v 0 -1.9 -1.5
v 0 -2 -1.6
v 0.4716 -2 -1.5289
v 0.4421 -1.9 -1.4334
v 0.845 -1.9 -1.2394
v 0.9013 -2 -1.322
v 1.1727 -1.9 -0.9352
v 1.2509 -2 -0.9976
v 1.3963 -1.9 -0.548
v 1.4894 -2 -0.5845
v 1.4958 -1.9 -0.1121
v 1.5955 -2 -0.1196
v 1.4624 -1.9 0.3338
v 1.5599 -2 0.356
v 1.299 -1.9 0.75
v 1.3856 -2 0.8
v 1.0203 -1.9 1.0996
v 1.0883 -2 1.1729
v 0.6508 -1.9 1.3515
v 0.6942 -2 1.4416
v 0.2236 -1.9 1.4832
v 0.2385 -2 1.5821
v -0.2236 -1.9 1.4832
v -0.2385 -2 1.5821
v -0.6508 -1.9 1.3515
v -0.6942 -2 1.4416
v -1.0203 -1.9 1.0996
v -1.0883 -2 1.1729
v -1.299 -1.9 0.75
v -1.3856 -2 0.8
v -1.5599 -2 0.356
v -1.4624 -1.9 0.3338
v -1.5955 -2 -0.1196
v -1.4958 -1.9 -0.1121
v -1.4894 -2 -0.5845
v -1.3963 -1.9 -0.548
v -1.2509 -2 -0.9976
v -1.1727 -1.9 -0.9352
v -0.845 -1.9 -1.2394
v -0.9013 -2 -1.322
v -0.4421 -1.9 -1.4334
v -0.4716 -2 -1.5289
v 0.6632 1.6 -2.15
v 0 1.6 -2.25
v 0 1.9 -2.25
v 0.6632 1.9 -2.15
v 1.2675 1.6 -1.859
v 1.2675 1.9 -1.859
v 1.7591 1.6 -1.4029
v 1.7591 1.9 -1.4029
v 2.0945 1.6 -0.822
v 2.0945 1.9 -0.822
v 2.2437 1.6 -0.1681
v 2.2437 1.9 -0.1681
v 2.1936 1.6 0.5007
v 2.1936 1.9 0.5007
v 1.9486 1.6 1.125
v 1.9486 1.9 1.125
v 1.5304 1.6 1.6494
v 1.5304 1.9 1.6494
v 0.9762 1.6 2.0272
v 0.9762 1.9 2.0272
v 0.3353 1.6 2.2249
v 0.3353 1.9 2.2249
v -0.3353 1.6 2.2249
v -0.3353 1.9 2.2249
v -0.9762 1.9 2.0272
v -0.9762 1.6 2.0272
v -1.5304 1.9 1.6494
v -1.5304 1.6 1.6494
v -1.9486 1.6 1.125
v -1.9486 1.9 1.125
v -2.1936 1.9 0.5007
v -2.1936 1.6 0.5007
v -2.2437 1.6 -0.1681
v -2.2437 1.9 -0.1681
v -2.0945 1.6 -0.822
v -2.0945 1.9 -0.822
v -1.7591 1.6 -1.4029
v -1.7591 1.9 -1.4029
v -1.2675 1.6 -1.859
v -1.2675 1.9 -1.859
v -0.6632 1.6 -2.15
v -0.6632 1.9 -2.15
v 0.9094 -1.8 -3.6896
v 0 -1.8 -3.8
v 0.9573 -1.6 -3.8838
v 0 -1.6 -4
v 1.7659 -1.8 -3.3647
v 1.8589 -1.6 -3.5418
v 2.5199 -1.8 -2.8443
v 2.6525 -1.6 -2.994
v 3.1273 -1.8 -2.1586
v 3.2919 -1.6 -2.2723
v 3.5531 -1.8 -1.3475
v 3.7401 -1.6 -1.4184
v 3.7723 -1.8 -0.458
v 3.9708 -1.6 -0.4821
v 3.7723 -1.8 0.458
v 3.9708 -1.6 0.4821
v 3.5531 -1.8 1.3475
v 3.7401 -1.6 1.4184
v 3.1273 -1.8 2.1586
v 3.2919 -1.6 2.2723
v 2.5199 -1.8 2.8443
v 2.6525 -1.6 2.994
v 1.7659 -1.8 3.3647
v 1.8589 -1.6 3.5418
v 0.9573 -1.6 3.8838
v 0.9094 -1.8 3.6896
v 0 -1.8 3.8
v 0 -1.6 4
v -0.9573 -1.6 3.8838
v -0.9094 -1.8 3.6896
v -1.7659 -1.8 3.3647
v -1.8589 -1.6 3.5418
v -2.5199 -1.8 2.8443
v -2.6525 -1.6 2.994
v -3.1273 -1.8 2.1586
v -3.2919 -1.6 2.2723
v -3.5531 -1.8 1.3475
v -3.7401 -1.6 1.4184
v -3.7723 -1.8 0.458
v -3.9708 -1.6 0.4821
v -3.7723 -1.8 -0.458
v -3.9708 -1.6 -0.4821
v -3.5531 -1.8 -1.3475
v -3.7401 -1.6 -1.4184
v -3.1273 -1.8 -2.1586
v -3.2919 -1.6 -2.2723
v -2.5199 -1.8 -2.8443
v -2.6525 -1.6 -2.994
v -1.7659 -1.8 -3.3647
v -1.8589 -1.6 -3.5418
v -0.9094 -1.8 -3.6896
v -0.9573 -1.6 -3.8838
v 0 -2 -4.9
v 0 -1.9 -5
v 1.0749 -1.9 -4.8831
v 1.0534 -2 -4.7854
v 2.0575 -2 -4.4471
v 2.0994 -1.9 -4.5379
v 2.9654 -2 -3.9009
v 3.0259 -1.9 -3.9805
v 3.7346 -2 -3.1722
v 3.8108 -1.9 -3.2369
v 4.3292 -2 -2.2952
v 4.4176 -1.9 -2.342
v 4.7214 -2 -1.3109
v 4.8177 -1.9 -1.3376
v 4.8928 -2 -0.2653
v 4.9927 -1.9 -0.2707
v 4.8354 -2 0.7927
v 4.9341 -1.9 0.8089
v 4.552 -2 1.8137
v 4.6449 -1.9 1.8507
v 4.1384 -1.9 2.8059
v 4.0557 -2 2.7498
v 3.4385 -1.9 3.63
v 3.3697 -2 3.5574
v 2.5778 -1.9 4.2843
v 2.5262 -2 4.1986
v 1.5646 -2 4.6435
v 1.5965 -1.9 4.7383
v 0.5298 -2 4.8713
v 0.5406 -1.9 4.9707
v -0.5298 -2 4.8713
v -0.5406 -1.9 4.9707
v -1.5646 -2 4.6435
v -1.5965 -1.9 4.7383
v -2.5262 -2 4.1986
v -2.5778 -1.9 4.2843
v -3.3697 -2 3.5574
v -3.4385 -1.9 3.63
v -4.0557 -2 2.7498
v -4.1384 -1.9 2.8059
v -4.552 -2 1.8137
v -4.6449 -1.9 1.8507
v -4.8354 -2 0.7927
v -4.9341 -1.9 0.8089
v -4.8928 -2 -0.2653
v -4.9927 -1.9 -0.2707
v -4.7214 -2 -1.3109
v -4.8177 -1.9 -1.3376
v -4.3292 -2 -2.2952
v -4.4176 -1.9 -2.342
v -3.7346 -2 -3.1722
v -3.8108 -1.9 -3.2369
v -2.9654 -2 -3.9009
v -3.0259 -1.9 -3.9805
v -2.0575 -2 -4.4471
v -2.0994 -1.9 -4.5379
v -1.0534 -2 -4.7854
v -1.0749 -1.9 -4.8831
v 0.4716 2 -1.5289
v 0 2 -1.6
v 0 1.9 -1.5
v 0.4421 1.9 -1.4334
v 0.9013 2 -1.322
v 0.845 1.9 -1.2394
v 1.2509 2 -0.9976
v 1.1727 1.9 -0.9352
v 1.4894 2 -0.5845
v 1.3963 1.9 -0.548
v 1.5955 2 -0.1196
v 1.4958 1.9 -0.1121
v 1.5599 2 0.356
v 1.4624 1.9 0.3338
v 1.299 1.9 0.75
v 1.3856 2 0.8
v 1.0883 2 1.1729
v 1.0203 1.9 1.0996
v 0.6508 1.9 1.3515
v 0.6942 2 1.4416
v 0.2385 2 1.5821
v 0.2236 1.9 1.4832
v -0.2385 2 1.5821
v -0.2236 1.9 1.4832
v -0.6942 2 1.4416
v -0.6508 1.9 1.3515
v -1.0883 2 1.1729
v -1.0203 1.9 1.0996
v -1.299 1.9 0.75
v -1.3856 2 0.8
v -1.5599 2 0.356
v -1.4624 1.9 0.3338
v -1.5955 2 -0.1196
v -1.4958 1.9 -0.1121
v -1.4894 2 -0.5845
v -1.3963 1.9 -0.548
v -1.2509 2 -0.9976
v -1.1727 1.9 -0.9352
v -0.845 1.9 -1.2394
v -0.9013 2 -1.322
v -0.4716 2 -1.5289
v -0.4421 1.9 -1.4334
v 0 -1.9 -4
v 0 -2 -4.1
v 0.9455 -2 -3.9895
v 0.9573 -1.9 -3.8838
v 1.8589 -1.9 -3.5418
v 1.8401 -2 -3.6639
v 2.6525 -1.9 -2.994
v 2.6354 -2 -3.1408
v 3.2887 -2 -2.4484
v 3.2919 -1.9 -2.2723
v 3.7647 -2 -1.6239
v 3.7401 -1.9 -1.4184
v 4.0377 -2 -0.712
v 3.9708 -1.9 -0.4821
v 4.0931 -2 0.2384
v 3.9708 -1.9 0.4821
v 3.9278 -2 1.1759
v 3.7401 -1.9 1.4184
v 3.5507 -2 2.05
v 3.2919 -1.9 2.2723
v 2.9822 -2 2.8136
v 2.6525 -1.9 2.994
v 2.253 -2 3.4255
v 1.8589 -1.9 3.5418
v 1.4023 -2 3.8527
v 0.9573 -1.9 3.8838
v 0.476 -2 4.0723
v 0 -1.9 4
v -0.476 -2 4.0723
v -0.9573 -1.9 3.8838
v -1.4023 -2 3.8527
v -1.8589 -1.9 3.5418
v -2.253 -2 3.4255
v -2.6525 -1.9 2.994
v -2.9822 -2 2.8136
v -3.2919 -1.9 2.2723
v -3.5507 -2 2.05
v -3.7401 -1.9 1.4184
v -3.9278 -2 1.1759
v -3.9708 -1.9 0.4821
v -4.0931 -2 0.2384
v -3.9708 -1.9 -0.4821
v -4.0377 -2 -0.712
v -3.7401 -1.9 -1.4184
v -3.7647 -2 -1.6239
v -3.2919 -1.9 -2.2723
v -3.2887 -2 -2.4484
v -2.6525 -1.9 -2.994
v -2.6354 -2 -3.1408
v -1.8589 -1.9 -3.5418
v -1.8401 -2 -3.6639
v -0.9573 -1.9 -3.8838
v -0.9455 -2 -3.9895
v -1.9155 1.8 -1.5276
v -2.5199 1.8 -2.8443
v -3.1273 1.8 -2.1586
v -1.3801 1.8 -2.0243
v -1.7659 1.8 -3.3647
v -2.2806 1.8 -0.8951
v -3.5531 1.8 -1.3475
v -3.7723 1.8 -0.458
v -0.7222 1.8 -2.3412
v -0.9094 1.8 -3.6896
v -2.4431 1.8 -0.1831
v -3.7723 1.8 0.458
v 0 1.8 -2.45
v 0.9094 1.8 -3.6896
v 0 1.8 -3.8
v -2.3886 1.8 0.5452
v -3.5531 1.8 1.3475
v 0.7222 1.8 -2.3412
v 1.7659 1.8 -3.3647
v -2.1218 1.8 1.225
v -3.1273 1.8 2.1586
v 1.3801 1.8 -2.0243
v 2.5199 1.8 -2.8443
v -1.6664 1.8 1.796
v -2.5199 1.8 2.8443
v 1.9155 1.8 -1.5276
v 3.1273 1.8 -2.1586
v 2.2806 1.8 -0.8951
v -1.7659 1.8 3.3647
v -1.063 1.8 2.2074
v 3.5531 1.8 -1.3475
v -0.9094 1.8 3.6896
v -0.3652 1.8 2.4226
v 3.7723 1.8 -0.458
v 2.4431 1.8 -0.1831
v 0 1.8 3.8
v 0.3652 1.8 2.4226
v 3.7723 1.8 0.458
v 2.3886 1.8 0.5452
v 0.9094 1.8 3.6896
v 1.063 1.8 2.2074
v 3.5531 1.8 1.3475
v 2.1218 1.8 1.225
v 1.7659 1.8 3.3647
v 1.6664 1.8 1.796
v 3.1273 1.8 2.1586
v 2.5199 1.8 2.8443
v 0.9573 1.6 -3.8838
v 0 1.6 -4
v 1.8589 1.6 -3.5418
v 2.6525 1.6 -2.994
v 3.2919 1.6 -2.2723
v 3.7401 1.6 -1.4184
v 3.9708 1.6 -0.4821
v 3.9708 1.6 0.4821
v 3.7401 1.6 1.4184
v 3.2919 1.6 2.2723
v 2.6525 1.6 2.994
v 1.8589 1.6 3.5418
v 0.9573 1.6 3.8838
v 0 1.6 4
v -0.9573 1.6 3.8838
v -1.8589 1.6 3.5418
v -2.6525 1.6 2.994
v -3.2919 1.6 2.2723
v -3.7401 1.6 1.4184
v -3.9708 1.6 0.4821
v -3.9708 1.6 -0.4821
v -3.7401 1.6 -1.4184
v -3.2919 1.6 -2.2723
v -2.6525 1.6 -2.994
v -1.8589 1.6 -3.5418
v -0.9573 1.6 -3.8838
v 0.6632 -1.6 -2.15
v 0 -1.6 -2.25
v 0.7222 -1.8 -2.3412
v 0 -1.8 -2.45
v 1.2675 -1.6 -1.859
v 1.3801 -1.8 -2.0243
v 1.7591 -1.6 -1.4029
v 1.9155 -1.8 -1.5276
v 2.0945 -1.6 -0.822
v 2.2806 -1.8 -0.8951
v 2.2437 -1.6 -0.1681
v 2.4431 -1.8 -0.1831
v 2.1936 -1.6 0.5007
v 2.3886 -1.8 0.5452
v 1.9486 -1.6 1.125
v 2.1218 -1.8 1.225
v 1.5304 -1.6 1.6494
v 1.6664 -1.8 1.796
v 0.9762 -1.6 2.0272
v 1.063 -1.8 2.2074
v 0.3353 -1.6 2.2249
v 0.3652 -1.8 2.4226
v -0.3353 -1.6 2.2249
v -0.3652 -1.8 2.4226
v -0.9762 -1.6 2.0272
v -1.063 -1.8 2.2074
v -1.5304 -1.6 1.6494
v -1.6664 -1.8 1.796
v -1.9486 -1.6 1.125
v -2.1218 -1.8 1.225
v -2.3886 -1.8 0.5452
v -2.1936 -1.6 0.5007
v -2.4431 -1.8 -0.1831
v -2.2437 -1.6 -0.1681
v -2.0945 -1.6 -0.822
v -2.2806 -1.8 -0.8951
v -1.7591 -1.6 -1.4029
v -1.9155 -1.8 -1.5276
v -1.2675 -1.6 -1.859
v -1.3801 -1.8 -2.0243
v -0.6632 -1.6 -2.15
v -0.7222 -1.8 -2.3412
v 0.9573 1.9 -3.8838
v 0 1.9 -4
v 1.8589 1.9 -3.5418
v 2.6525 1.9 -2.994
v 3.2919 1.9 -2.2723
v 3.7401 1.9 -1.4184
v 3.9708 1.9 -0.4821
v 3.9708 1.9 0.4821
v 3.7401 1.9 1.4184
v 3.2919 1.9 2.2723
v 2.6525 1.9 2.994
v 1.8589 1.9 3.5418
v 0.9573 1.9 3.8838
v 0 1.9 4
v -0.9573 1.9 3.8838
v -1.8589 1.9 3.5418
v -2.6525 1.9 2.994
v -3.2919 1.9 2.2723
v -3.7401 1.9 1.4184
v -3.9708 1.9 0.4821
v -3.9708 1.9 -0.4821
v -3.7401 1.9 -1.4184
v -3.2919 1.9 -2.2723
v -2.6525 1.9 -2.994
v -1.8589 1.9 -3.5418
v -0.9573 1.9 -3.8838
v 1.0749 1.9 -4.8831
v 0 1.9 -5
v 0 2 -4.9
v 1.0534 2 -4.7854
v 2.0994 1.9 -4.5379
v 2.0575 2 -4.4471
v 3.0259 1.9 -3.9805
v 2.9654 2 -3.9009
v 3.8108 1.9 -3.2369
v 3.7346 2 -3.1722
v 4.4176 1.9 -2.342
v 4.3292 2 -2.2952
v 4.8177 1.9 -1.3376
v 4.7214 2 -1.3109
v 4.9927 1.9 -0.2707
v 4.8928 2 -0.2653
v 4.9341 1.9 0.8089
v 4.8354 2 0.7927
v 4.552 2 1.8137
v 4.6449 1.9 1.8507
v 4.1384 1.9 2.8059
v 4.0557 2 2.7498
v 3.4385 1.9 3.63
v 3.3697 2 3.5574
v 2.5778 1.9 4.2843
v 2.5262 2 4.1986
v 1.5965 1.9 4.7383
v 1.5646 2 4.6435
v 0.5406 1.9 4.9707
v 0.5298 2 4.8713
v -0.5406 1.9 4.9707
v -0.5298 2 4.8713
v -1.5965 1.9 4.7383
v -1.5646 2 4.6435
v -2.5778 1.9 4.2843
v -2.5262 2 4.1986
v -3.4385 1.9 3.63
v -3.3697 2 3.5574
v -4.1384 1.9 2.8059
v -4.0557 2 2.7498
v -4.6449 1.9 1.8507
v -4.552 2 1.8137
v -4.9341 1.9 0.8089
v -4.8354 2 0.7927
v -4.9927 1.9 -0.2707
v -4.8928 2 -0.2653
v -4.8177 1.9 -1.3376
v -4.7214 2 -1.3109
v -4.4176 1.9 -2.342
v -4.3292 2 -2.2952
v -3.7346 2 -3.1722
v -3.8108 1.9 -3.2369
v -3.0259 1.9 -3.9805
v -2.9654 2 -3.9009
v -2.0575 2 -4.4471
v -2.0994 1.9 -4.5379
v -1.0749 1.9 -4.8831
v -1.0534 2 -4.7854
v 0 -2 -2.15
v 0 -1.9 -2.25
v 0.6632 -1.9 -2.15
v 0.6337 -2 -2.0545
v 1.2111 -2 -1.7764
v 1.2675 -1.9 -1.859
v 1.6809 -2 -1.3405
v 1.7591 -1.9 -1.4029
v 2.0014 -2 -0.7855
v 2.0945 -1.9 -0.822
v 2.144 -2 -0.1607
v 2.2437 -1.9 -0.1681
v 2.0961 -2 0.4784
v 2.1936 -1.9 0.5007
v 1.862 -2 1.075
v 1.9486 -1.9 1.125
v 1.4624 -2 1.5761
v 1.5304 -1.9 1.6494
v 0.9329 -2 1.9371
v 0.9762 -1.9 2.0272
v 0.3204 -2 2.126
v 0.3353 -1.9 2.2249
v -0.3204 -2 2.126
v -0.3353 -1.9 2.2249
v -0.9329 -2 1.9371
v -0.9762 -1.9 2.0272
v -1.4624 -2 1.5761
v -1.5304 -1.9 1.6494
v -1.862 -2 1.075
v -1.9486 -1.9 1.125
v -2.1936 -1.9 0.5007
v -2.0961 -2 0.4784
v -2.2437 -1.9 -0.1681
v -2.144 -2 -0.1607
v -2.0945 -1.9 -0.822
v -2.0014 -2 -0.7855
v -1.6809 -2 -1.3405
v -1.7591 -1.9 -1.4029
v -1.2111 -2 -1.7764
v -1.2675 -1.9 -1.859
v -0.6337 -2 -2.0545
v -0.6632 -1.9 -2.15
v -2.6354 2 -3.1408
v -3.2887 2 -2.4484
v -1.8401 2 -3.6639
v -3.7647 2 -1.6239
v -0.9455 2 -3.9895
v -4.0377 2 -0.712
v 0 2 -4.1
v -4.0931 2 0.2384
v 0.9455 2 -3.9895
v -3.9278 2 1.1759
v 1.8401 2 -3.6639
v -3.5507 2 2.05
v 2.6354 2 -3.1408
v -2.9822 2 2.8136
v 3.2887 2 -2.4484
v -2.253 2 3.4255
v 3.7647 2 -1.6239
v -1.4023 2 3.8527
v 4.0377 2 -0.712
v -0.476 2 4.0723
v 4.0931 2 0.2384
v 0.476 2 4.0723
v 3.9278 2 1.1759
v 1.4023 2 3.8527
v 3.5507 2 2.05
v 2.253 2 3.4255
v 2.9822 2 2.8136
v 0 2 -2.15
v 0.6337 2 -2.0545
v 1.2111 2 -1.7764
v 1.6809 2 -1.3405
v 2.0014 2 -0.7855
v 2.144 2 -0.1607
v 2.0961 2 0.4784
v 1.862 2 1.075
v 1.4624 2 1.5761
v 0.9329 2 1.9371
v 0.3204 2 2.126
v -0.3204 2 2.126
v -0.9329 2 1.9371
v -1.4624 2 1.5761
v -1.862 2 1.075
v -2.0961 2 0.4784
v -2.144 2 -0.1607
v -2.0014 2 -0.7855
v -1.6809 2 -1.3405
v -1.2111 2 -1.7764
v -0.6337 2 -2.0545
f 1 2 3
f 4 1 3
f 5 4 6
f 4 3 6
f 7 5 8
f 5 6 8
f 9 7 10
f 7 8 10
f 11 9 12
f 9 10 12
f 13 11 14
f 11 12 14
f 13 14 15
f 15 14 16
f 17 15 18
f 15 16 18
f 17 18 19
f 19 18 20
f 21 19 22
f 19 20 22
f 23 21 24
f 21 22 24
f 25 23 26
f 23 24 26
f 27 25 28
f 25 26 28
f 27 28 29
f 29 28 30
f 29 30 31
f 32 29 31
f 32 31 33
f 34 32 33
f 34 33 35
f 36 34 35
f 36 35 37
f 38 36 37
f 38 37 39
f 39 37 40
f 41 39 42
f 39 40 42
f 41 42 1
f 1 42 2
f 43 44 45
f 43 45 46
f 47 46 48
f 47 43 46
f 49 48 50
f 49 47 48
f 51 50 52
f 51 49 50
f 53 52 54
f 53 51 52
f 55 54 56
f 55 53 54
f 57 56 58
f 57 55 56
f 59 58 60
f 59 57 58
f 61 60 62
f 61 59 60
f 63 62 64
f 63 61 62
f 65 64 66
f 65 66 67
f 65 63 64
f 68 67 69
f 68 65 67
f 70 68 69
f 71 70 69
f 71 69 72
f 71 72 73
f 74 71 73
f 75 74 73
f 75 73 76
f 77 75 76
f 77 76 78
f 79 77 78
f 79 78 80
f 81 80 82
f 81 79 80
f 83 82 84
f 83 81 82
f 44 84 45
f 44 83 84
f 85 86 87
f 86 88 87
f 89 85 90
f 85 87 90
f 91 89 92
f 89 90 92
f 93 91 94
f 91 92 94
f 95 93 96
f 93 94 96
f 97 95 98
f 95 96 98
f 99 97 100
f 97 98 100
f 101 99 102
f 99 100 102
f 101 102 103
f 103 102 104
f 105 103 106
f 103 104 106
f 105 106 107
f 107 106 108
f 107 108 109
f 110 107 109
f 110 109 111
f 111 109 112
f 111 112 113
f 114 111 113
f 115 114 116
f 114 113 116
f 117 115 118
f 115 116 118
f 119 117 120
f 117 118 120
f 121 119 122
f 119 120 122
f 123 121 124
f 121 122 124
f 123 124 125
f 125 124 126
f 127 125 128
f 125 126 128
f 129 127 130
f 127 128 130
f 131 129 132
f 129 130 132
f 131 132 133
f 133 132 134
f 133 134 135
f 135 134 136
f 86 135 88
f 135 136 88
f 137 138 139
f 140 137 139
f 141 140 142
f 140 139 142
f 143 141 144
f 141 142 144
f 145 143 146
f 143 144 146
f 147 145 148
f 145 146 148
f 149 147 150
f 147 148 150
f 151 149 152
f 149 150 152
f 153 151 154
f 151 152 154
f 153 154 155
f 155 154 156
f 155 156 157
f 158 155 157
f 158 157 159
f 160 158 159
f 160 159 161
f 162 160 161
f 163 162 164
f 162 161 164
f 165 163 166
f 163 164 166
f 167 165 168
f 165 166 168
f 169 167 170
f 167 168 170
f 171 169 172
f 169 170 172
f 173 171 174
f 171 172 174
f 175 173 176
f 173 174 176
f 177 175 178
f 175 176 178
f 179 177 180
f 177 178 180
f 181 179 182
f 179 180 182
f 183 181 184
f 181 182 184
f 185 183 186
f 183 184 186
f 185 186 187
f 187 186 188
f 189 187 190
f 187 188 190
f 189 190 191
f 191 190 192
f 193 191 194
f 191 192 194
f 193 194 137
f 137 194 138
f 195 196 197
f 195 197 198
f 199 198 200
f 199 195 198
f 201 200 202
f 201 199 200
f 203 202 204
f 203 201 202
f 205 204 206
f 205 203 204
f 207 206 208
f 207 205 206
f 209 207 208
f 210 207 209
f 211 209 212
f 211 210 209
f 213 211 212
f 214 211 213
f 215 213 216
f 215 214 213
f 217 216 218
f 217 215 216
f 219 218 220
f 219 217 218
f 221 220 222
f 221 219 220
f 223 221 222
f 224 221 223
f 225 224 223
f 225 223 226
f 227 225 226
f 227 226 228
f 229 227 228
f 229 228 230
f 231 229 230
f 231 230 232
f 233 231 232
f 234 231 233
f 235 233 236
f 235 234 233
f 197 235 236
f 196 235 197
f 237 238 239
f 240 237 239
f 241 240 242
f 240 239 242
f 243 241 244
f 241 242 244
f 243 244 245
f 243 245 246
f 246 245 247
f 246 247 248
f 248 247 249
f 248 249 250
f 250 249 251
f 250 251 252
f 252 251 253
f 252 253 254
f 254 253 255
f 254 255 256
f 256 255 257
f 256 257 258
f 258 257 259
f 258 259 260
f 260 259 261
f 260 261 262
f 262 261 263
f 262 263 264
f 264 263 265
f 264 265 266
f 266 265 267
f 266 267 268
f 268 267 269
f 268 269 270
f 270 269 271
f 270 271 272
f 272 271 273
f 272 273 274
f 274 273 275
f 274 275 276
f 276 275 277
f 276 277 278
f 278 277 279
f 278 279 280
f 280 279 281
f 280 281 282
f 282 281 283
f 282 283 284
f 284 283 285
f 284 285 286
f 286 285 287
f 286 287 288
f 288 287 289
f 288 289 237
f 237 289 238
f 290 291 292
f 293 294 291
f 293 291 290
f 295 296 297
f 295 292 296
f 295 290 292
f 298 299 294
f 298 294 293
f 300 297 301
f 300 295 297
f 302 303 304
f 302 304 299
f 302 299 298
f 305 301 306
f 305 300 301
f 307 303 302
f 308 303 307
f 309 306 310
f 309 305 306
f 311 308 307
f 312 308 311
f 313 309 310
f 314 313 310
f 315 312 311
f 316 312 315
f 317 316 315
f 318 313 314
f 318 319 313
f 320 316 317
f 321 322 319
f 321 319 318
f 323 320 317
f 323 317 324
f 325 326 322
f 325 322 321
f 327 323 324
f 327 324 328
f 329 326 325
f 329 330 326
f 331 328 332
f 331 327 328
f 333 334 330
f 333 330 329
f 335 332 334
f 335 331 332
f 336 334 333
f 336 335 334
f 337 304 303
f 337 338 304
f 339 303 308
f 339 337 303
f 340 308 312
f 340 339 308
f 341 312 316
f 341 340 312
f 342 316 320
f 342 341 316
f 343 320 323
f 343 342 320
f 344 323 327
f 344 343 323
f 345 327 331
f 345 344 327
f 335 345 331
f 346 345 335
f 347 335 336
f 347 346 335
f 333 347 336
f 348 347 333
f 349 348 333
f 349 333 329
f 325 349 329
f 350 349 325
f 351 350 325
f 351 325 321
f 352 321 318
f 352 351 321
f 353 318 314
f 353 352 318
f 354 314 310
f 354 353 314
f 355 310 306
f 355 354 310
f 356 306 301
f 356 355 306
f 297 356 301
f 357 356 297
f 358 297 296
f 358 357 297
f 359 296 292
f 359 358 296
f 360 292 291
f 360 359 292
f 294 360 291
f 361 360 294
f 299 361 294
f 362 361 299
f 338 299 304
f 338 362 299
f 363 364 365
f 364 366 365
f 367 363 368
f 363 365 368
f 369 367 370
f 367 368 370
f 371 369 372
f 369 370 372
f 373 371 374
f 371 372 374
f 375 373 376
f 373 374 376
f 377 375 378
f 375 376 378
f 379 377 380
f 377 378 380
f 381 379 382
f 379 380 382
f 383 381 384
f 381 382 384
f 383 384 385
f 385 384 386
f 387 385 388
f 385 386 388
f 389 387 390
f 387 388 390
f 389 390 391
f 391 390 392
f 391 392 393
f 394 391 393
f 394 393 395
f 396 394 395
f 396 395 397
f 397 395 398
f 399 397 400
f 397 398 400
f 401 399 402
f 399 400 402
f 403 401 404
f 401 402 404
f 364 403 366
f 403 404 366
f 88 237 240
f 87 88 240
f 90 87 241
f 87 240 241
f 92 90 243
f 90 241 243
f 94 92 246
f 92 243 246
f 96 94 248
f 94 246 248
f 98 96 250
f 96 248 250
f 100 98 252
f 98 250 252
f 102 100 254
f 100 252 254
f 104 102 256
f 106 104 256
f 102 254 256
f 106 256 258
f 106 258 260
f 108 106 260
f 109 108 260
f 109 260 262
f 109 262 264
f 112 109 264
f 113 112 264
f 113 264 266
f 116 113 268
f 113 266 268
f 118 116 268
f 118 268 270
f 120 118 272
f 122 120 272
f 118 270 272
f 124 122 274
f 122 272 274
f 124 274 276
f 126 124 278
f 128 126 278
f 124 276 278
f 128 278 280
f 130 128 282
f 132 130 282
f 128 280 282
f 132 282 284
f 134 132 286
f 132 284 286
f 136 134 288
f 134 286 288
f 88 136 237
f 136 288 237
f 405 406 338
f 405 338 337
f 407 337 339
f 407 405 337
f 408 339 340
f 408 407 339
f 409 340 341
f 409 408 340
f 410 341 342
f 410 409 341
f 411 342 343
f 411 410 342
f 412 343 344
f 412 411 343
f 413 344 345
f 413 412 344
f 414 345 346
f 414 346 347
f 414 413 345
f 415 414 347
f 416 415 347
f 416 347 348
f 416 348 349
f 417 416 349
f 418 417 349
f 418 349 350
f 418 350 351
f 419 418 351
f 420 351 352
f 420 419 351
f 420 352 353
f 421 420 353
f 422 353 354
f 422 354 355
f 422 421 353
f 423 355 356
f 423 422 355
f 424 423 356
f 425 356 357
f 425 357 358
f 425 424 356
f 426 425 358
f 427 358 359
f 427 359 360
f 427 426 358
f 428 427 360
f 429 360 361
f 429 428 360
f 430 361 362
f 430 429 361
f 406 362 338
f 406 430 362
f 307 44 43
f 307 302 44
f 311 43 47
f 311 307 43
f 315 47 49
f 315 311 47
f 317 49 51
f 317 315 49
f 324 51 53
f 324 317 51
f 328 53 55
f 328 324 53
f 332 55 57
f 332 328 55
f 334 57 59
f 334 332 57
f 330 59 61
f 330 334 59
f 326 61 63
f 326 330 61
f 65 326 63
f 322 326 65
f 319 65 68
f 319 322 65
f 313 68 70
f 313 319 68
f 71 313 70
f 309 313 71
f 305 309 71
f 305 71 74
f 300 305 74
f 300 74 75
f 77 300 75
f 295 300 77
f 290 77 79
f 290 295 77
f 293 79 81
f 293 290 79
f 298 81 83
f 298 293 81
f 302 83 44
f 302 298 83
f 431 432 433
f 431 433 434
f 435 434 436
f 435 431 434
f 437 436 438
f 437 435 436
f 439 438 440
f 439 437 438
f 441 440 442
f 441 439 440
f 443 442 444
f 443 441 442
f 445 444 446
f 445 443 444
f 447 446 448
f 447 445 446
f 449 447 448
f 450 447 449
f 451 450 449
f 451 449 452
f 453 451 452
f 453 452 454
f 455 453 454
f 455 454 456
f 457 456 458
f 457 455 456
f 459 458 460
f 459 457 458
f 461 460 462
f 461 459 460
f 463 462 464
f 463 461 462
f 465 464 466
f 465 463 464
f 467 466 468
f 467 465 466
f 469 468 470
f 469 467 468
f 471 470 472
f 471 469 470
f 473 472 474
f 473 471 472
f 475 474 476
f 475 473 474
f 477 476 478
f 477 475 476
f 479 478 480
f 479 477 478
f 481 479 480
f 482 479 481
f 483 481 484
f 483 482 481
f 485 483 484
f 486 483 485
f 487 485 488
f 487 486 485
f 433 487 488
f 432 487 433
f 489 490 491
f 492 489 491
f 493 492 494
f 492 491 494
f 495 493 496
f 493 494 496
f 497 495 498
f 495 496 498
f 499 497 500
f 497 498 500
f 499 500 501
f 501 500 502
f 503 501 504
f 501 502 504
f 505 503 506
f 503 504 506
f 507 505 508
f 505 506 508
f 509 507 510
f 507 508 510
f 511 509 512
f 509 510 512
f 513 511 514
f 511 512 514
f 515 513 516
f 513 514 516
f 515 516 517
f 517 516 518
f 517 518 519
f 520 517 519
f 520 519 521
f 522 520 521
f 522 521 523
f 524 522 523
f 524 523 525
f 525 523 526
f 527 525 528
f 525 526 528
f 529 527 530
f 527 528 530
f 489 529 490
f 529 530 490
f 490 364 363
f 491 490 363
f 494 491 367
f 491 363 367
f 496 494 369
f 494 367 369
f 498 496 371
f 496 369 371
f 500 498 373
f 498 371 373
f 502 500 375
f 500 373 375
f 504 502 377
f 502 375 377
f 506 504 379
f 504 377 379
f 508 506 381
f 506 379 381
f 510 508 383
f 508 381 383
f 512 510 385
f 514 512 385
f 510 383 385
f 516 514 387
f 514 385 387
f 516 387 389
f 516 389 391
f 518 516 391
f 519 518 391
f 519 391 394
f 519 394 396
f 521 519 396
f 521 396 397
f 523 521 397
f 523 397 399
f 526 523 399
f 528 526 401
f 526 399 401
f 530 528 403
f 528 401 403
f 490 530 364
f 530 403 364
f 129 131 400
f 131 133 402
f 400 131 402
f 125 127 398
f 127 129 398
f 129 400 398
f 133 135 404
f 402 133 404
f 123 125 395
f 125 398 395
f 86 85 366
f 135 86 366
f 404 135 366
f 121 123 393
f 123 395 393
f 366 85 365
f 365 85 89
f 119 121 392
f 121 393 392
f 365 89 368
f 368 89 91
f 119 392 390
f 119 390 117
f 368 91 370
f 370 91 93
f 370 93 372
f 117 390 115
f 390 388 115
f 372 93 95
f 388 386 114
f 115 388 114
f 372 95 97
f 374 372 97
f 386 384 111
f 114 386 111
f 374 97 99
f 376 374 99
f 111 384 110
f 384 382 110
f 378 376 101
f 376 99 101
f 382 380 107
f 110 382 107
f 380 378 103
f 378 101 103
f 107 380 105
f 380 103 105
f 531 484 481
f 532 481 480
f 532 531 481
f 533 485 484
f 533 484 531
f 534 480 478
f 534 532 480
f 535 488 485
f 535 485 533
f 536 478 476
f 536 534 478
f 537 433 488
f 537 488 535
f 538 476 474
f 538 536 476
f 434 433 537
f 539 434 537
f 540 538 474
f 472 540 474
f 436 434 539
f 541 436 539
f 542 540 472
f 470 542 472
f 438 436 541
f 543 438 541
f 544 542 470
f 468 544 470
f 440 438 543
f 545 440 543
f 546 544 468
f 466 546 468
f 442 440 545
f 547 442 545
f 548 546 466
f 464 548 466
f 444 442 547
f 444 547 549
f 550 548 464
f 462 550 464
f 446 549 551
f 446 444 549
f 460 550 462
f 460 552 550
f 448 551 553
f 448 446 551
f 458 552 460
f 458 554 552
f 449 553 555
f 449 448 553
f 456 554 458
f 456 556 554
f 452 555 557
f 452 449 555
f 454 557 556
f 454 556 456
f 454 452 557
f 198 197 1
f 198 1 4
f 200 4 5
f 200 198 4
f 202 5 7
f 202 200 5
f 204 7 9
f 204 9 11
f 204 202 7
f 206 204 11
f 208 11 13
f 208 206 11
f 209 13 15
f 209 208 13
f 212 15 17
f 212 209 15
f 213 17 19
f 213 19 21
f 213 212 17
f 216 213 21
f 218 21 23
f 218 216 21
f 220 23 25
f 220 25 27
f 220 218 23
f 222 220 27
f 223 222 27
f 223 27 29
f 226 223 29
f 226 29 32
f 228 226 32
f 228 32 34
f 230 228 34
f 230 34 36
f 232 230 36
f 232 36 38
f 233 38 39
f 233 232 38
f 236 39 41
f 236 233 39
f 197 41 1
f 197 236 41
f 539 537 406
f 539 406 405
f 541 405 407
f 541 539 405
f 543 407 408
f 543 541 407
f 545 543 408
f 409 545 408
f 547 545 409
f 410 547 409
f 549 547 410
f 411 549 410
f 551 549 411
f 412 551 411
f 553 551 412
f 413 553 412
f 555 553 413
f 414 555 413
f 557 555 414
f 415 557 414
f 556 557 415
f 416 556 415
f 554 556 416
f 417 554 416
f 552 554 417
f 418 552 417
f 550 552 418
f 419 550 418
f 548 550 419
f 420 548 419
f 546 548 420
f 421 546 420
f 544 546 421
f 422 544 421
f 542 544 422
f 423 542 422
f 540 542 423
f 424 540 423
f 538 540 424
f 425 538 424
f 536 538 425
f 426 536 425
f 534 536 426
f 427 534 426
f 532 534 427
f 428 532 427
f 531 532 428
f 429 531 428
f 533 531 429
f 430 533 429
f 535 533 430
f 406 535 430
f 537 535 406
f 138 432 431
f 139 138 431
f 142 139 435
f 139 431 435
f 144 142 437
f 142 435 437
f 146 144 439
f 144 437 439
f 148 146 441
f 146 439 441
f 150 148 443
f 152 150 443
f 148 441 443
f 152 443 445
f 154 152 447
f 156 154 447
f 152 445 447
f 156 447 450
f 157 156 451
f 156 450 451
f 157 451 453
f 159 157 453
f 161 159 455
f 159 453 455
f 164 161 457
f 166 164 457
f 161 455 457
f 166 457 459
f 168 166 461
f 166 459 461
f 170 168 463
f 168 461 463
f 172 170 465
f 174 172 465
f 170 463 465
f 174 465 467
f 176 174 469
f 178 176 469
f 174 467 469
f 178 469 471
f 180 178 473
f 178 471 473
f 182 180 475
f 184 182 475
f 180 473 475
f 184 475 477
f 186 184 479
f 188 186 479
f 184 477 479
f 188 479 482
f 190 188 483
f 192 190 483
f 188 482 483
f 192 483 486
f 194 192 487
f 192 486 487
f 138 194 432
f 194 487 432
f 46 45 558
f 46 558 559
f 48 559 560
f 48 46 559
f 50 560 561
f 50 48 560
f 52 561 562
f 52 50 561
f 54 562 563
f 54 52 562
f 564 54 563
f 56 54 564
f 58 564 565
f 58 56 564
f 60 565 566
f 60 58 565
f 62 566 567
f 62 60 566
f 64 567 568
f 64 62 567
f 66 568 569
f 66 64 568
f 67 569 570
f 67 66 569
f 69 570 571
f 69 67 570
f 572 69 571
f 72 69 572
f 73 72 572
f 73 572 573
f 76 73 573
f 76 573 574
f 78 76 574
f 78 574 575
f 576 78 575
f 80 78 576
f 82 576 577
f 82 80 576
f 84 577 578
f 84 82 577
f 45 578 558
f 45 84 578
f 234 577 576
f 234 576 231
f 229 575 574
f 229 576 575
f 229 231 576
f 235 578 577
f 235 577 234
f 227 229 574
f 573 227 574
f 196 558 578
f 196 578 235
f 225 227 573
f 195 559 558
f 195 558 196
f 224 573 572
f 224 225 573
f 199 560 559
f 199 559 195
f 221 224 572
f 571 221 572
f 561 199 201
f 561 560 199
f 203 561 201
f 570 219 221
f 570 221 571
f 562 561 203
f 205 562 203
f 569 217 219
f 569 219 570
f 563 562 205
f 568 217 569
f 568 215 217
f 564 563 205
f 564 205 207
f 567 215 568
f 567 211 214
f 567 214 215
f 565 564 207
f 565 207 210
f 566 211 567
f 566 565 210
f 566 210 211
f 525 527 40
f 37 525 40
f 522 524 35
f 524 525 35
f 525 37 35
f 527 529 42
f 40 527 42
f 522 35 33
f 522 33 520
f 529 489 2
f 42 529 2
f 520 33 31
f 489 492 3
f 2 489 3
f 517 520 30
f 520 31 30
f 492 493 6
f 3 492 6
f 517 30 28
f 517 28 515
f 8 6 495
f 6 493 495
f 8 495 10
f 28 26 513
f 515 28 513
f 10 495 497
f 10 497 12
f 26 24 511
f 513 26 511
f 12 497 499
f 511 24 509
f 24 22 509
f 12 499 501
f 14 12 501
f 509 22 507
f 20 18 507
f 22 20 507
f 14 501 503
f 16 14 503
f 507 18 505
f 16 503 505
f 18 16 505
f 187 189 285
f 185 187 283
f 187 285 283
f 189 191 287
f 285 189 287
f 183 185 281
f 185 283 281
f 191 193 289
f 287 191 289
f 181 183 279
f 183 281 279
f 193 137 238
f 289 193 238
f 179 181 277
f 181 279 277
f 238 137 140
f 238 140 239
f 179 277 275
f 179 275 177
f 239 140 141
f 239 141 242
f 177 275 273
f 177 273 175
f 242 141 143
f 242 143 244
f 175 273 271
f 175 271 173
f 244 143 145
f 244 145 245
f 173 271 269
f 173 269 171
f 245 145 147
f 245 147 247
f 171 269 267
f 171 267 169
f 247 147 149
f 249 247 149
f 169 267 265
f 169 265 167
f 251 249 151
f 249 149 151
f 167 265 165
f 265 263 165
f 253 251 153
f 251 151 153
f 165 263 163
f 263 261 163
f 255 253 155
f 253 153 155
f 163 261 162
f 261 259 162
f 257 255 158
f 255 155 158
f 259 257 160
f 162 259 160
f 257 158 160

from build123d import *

# Parameters (mm, degrees)
SKETCH1_W     = 3.5
SKETCH1_H     = 4
CHAMFER1_SIZE = 0.1


with BuildPart() as part:
    # Sketch1 → Revolve1 (revolve)
    with BuildSketch(Plane(origin=(0, 0, 0), x_dir=(0, 0, -1), z_dir=(1, 0, 0))):
        with Locations((3.25, 0)):
            Rectangle(SKETCH1_W, SKETCH1_H)
    revolve(axis=Axis((0, 2, 0), (0, -1, 0)))

    # Sketch3 → Cut-Revolve2 (revolve, cut)
    with BuildSketch(Plane(origin=(0, 0, 0), x_dir=(0, 0, -1), z_dir=(1, 0, 0))):
        Polygon((3.8, 1.8), (4, 1.6), (4, 2), (2.25, 2), (2.25, 1.6), (2.45, 1.8), align=None)
    cut_revolve2 = revolve(axis=Axis((0, 2, 0), (0, -1, 0)), mode=Mode.SUBTRACT)

    # Mirror1: Cut-Revolve2 across plane
    add(cut_revolve2.mirror(Plane.ZX), mode=Mode.SUBTRACT)

    # Chamfer1
    chamfer1_edges = [part.edges().sort_by_distance(p)[0] for p in [
        (0, 2, 4),
        (0, 2, 2.25),
        (0, -2, 4),
        (0, -2, 2.25),
        (0, 2, 5),
        (0, -2, 5),
        (0, -2, 1.5),
        (0, 2, 1.5),
    ]]
    chamfer(chamfer1_edges, length=CHAMFER1_SIZE)


solid = part.part
